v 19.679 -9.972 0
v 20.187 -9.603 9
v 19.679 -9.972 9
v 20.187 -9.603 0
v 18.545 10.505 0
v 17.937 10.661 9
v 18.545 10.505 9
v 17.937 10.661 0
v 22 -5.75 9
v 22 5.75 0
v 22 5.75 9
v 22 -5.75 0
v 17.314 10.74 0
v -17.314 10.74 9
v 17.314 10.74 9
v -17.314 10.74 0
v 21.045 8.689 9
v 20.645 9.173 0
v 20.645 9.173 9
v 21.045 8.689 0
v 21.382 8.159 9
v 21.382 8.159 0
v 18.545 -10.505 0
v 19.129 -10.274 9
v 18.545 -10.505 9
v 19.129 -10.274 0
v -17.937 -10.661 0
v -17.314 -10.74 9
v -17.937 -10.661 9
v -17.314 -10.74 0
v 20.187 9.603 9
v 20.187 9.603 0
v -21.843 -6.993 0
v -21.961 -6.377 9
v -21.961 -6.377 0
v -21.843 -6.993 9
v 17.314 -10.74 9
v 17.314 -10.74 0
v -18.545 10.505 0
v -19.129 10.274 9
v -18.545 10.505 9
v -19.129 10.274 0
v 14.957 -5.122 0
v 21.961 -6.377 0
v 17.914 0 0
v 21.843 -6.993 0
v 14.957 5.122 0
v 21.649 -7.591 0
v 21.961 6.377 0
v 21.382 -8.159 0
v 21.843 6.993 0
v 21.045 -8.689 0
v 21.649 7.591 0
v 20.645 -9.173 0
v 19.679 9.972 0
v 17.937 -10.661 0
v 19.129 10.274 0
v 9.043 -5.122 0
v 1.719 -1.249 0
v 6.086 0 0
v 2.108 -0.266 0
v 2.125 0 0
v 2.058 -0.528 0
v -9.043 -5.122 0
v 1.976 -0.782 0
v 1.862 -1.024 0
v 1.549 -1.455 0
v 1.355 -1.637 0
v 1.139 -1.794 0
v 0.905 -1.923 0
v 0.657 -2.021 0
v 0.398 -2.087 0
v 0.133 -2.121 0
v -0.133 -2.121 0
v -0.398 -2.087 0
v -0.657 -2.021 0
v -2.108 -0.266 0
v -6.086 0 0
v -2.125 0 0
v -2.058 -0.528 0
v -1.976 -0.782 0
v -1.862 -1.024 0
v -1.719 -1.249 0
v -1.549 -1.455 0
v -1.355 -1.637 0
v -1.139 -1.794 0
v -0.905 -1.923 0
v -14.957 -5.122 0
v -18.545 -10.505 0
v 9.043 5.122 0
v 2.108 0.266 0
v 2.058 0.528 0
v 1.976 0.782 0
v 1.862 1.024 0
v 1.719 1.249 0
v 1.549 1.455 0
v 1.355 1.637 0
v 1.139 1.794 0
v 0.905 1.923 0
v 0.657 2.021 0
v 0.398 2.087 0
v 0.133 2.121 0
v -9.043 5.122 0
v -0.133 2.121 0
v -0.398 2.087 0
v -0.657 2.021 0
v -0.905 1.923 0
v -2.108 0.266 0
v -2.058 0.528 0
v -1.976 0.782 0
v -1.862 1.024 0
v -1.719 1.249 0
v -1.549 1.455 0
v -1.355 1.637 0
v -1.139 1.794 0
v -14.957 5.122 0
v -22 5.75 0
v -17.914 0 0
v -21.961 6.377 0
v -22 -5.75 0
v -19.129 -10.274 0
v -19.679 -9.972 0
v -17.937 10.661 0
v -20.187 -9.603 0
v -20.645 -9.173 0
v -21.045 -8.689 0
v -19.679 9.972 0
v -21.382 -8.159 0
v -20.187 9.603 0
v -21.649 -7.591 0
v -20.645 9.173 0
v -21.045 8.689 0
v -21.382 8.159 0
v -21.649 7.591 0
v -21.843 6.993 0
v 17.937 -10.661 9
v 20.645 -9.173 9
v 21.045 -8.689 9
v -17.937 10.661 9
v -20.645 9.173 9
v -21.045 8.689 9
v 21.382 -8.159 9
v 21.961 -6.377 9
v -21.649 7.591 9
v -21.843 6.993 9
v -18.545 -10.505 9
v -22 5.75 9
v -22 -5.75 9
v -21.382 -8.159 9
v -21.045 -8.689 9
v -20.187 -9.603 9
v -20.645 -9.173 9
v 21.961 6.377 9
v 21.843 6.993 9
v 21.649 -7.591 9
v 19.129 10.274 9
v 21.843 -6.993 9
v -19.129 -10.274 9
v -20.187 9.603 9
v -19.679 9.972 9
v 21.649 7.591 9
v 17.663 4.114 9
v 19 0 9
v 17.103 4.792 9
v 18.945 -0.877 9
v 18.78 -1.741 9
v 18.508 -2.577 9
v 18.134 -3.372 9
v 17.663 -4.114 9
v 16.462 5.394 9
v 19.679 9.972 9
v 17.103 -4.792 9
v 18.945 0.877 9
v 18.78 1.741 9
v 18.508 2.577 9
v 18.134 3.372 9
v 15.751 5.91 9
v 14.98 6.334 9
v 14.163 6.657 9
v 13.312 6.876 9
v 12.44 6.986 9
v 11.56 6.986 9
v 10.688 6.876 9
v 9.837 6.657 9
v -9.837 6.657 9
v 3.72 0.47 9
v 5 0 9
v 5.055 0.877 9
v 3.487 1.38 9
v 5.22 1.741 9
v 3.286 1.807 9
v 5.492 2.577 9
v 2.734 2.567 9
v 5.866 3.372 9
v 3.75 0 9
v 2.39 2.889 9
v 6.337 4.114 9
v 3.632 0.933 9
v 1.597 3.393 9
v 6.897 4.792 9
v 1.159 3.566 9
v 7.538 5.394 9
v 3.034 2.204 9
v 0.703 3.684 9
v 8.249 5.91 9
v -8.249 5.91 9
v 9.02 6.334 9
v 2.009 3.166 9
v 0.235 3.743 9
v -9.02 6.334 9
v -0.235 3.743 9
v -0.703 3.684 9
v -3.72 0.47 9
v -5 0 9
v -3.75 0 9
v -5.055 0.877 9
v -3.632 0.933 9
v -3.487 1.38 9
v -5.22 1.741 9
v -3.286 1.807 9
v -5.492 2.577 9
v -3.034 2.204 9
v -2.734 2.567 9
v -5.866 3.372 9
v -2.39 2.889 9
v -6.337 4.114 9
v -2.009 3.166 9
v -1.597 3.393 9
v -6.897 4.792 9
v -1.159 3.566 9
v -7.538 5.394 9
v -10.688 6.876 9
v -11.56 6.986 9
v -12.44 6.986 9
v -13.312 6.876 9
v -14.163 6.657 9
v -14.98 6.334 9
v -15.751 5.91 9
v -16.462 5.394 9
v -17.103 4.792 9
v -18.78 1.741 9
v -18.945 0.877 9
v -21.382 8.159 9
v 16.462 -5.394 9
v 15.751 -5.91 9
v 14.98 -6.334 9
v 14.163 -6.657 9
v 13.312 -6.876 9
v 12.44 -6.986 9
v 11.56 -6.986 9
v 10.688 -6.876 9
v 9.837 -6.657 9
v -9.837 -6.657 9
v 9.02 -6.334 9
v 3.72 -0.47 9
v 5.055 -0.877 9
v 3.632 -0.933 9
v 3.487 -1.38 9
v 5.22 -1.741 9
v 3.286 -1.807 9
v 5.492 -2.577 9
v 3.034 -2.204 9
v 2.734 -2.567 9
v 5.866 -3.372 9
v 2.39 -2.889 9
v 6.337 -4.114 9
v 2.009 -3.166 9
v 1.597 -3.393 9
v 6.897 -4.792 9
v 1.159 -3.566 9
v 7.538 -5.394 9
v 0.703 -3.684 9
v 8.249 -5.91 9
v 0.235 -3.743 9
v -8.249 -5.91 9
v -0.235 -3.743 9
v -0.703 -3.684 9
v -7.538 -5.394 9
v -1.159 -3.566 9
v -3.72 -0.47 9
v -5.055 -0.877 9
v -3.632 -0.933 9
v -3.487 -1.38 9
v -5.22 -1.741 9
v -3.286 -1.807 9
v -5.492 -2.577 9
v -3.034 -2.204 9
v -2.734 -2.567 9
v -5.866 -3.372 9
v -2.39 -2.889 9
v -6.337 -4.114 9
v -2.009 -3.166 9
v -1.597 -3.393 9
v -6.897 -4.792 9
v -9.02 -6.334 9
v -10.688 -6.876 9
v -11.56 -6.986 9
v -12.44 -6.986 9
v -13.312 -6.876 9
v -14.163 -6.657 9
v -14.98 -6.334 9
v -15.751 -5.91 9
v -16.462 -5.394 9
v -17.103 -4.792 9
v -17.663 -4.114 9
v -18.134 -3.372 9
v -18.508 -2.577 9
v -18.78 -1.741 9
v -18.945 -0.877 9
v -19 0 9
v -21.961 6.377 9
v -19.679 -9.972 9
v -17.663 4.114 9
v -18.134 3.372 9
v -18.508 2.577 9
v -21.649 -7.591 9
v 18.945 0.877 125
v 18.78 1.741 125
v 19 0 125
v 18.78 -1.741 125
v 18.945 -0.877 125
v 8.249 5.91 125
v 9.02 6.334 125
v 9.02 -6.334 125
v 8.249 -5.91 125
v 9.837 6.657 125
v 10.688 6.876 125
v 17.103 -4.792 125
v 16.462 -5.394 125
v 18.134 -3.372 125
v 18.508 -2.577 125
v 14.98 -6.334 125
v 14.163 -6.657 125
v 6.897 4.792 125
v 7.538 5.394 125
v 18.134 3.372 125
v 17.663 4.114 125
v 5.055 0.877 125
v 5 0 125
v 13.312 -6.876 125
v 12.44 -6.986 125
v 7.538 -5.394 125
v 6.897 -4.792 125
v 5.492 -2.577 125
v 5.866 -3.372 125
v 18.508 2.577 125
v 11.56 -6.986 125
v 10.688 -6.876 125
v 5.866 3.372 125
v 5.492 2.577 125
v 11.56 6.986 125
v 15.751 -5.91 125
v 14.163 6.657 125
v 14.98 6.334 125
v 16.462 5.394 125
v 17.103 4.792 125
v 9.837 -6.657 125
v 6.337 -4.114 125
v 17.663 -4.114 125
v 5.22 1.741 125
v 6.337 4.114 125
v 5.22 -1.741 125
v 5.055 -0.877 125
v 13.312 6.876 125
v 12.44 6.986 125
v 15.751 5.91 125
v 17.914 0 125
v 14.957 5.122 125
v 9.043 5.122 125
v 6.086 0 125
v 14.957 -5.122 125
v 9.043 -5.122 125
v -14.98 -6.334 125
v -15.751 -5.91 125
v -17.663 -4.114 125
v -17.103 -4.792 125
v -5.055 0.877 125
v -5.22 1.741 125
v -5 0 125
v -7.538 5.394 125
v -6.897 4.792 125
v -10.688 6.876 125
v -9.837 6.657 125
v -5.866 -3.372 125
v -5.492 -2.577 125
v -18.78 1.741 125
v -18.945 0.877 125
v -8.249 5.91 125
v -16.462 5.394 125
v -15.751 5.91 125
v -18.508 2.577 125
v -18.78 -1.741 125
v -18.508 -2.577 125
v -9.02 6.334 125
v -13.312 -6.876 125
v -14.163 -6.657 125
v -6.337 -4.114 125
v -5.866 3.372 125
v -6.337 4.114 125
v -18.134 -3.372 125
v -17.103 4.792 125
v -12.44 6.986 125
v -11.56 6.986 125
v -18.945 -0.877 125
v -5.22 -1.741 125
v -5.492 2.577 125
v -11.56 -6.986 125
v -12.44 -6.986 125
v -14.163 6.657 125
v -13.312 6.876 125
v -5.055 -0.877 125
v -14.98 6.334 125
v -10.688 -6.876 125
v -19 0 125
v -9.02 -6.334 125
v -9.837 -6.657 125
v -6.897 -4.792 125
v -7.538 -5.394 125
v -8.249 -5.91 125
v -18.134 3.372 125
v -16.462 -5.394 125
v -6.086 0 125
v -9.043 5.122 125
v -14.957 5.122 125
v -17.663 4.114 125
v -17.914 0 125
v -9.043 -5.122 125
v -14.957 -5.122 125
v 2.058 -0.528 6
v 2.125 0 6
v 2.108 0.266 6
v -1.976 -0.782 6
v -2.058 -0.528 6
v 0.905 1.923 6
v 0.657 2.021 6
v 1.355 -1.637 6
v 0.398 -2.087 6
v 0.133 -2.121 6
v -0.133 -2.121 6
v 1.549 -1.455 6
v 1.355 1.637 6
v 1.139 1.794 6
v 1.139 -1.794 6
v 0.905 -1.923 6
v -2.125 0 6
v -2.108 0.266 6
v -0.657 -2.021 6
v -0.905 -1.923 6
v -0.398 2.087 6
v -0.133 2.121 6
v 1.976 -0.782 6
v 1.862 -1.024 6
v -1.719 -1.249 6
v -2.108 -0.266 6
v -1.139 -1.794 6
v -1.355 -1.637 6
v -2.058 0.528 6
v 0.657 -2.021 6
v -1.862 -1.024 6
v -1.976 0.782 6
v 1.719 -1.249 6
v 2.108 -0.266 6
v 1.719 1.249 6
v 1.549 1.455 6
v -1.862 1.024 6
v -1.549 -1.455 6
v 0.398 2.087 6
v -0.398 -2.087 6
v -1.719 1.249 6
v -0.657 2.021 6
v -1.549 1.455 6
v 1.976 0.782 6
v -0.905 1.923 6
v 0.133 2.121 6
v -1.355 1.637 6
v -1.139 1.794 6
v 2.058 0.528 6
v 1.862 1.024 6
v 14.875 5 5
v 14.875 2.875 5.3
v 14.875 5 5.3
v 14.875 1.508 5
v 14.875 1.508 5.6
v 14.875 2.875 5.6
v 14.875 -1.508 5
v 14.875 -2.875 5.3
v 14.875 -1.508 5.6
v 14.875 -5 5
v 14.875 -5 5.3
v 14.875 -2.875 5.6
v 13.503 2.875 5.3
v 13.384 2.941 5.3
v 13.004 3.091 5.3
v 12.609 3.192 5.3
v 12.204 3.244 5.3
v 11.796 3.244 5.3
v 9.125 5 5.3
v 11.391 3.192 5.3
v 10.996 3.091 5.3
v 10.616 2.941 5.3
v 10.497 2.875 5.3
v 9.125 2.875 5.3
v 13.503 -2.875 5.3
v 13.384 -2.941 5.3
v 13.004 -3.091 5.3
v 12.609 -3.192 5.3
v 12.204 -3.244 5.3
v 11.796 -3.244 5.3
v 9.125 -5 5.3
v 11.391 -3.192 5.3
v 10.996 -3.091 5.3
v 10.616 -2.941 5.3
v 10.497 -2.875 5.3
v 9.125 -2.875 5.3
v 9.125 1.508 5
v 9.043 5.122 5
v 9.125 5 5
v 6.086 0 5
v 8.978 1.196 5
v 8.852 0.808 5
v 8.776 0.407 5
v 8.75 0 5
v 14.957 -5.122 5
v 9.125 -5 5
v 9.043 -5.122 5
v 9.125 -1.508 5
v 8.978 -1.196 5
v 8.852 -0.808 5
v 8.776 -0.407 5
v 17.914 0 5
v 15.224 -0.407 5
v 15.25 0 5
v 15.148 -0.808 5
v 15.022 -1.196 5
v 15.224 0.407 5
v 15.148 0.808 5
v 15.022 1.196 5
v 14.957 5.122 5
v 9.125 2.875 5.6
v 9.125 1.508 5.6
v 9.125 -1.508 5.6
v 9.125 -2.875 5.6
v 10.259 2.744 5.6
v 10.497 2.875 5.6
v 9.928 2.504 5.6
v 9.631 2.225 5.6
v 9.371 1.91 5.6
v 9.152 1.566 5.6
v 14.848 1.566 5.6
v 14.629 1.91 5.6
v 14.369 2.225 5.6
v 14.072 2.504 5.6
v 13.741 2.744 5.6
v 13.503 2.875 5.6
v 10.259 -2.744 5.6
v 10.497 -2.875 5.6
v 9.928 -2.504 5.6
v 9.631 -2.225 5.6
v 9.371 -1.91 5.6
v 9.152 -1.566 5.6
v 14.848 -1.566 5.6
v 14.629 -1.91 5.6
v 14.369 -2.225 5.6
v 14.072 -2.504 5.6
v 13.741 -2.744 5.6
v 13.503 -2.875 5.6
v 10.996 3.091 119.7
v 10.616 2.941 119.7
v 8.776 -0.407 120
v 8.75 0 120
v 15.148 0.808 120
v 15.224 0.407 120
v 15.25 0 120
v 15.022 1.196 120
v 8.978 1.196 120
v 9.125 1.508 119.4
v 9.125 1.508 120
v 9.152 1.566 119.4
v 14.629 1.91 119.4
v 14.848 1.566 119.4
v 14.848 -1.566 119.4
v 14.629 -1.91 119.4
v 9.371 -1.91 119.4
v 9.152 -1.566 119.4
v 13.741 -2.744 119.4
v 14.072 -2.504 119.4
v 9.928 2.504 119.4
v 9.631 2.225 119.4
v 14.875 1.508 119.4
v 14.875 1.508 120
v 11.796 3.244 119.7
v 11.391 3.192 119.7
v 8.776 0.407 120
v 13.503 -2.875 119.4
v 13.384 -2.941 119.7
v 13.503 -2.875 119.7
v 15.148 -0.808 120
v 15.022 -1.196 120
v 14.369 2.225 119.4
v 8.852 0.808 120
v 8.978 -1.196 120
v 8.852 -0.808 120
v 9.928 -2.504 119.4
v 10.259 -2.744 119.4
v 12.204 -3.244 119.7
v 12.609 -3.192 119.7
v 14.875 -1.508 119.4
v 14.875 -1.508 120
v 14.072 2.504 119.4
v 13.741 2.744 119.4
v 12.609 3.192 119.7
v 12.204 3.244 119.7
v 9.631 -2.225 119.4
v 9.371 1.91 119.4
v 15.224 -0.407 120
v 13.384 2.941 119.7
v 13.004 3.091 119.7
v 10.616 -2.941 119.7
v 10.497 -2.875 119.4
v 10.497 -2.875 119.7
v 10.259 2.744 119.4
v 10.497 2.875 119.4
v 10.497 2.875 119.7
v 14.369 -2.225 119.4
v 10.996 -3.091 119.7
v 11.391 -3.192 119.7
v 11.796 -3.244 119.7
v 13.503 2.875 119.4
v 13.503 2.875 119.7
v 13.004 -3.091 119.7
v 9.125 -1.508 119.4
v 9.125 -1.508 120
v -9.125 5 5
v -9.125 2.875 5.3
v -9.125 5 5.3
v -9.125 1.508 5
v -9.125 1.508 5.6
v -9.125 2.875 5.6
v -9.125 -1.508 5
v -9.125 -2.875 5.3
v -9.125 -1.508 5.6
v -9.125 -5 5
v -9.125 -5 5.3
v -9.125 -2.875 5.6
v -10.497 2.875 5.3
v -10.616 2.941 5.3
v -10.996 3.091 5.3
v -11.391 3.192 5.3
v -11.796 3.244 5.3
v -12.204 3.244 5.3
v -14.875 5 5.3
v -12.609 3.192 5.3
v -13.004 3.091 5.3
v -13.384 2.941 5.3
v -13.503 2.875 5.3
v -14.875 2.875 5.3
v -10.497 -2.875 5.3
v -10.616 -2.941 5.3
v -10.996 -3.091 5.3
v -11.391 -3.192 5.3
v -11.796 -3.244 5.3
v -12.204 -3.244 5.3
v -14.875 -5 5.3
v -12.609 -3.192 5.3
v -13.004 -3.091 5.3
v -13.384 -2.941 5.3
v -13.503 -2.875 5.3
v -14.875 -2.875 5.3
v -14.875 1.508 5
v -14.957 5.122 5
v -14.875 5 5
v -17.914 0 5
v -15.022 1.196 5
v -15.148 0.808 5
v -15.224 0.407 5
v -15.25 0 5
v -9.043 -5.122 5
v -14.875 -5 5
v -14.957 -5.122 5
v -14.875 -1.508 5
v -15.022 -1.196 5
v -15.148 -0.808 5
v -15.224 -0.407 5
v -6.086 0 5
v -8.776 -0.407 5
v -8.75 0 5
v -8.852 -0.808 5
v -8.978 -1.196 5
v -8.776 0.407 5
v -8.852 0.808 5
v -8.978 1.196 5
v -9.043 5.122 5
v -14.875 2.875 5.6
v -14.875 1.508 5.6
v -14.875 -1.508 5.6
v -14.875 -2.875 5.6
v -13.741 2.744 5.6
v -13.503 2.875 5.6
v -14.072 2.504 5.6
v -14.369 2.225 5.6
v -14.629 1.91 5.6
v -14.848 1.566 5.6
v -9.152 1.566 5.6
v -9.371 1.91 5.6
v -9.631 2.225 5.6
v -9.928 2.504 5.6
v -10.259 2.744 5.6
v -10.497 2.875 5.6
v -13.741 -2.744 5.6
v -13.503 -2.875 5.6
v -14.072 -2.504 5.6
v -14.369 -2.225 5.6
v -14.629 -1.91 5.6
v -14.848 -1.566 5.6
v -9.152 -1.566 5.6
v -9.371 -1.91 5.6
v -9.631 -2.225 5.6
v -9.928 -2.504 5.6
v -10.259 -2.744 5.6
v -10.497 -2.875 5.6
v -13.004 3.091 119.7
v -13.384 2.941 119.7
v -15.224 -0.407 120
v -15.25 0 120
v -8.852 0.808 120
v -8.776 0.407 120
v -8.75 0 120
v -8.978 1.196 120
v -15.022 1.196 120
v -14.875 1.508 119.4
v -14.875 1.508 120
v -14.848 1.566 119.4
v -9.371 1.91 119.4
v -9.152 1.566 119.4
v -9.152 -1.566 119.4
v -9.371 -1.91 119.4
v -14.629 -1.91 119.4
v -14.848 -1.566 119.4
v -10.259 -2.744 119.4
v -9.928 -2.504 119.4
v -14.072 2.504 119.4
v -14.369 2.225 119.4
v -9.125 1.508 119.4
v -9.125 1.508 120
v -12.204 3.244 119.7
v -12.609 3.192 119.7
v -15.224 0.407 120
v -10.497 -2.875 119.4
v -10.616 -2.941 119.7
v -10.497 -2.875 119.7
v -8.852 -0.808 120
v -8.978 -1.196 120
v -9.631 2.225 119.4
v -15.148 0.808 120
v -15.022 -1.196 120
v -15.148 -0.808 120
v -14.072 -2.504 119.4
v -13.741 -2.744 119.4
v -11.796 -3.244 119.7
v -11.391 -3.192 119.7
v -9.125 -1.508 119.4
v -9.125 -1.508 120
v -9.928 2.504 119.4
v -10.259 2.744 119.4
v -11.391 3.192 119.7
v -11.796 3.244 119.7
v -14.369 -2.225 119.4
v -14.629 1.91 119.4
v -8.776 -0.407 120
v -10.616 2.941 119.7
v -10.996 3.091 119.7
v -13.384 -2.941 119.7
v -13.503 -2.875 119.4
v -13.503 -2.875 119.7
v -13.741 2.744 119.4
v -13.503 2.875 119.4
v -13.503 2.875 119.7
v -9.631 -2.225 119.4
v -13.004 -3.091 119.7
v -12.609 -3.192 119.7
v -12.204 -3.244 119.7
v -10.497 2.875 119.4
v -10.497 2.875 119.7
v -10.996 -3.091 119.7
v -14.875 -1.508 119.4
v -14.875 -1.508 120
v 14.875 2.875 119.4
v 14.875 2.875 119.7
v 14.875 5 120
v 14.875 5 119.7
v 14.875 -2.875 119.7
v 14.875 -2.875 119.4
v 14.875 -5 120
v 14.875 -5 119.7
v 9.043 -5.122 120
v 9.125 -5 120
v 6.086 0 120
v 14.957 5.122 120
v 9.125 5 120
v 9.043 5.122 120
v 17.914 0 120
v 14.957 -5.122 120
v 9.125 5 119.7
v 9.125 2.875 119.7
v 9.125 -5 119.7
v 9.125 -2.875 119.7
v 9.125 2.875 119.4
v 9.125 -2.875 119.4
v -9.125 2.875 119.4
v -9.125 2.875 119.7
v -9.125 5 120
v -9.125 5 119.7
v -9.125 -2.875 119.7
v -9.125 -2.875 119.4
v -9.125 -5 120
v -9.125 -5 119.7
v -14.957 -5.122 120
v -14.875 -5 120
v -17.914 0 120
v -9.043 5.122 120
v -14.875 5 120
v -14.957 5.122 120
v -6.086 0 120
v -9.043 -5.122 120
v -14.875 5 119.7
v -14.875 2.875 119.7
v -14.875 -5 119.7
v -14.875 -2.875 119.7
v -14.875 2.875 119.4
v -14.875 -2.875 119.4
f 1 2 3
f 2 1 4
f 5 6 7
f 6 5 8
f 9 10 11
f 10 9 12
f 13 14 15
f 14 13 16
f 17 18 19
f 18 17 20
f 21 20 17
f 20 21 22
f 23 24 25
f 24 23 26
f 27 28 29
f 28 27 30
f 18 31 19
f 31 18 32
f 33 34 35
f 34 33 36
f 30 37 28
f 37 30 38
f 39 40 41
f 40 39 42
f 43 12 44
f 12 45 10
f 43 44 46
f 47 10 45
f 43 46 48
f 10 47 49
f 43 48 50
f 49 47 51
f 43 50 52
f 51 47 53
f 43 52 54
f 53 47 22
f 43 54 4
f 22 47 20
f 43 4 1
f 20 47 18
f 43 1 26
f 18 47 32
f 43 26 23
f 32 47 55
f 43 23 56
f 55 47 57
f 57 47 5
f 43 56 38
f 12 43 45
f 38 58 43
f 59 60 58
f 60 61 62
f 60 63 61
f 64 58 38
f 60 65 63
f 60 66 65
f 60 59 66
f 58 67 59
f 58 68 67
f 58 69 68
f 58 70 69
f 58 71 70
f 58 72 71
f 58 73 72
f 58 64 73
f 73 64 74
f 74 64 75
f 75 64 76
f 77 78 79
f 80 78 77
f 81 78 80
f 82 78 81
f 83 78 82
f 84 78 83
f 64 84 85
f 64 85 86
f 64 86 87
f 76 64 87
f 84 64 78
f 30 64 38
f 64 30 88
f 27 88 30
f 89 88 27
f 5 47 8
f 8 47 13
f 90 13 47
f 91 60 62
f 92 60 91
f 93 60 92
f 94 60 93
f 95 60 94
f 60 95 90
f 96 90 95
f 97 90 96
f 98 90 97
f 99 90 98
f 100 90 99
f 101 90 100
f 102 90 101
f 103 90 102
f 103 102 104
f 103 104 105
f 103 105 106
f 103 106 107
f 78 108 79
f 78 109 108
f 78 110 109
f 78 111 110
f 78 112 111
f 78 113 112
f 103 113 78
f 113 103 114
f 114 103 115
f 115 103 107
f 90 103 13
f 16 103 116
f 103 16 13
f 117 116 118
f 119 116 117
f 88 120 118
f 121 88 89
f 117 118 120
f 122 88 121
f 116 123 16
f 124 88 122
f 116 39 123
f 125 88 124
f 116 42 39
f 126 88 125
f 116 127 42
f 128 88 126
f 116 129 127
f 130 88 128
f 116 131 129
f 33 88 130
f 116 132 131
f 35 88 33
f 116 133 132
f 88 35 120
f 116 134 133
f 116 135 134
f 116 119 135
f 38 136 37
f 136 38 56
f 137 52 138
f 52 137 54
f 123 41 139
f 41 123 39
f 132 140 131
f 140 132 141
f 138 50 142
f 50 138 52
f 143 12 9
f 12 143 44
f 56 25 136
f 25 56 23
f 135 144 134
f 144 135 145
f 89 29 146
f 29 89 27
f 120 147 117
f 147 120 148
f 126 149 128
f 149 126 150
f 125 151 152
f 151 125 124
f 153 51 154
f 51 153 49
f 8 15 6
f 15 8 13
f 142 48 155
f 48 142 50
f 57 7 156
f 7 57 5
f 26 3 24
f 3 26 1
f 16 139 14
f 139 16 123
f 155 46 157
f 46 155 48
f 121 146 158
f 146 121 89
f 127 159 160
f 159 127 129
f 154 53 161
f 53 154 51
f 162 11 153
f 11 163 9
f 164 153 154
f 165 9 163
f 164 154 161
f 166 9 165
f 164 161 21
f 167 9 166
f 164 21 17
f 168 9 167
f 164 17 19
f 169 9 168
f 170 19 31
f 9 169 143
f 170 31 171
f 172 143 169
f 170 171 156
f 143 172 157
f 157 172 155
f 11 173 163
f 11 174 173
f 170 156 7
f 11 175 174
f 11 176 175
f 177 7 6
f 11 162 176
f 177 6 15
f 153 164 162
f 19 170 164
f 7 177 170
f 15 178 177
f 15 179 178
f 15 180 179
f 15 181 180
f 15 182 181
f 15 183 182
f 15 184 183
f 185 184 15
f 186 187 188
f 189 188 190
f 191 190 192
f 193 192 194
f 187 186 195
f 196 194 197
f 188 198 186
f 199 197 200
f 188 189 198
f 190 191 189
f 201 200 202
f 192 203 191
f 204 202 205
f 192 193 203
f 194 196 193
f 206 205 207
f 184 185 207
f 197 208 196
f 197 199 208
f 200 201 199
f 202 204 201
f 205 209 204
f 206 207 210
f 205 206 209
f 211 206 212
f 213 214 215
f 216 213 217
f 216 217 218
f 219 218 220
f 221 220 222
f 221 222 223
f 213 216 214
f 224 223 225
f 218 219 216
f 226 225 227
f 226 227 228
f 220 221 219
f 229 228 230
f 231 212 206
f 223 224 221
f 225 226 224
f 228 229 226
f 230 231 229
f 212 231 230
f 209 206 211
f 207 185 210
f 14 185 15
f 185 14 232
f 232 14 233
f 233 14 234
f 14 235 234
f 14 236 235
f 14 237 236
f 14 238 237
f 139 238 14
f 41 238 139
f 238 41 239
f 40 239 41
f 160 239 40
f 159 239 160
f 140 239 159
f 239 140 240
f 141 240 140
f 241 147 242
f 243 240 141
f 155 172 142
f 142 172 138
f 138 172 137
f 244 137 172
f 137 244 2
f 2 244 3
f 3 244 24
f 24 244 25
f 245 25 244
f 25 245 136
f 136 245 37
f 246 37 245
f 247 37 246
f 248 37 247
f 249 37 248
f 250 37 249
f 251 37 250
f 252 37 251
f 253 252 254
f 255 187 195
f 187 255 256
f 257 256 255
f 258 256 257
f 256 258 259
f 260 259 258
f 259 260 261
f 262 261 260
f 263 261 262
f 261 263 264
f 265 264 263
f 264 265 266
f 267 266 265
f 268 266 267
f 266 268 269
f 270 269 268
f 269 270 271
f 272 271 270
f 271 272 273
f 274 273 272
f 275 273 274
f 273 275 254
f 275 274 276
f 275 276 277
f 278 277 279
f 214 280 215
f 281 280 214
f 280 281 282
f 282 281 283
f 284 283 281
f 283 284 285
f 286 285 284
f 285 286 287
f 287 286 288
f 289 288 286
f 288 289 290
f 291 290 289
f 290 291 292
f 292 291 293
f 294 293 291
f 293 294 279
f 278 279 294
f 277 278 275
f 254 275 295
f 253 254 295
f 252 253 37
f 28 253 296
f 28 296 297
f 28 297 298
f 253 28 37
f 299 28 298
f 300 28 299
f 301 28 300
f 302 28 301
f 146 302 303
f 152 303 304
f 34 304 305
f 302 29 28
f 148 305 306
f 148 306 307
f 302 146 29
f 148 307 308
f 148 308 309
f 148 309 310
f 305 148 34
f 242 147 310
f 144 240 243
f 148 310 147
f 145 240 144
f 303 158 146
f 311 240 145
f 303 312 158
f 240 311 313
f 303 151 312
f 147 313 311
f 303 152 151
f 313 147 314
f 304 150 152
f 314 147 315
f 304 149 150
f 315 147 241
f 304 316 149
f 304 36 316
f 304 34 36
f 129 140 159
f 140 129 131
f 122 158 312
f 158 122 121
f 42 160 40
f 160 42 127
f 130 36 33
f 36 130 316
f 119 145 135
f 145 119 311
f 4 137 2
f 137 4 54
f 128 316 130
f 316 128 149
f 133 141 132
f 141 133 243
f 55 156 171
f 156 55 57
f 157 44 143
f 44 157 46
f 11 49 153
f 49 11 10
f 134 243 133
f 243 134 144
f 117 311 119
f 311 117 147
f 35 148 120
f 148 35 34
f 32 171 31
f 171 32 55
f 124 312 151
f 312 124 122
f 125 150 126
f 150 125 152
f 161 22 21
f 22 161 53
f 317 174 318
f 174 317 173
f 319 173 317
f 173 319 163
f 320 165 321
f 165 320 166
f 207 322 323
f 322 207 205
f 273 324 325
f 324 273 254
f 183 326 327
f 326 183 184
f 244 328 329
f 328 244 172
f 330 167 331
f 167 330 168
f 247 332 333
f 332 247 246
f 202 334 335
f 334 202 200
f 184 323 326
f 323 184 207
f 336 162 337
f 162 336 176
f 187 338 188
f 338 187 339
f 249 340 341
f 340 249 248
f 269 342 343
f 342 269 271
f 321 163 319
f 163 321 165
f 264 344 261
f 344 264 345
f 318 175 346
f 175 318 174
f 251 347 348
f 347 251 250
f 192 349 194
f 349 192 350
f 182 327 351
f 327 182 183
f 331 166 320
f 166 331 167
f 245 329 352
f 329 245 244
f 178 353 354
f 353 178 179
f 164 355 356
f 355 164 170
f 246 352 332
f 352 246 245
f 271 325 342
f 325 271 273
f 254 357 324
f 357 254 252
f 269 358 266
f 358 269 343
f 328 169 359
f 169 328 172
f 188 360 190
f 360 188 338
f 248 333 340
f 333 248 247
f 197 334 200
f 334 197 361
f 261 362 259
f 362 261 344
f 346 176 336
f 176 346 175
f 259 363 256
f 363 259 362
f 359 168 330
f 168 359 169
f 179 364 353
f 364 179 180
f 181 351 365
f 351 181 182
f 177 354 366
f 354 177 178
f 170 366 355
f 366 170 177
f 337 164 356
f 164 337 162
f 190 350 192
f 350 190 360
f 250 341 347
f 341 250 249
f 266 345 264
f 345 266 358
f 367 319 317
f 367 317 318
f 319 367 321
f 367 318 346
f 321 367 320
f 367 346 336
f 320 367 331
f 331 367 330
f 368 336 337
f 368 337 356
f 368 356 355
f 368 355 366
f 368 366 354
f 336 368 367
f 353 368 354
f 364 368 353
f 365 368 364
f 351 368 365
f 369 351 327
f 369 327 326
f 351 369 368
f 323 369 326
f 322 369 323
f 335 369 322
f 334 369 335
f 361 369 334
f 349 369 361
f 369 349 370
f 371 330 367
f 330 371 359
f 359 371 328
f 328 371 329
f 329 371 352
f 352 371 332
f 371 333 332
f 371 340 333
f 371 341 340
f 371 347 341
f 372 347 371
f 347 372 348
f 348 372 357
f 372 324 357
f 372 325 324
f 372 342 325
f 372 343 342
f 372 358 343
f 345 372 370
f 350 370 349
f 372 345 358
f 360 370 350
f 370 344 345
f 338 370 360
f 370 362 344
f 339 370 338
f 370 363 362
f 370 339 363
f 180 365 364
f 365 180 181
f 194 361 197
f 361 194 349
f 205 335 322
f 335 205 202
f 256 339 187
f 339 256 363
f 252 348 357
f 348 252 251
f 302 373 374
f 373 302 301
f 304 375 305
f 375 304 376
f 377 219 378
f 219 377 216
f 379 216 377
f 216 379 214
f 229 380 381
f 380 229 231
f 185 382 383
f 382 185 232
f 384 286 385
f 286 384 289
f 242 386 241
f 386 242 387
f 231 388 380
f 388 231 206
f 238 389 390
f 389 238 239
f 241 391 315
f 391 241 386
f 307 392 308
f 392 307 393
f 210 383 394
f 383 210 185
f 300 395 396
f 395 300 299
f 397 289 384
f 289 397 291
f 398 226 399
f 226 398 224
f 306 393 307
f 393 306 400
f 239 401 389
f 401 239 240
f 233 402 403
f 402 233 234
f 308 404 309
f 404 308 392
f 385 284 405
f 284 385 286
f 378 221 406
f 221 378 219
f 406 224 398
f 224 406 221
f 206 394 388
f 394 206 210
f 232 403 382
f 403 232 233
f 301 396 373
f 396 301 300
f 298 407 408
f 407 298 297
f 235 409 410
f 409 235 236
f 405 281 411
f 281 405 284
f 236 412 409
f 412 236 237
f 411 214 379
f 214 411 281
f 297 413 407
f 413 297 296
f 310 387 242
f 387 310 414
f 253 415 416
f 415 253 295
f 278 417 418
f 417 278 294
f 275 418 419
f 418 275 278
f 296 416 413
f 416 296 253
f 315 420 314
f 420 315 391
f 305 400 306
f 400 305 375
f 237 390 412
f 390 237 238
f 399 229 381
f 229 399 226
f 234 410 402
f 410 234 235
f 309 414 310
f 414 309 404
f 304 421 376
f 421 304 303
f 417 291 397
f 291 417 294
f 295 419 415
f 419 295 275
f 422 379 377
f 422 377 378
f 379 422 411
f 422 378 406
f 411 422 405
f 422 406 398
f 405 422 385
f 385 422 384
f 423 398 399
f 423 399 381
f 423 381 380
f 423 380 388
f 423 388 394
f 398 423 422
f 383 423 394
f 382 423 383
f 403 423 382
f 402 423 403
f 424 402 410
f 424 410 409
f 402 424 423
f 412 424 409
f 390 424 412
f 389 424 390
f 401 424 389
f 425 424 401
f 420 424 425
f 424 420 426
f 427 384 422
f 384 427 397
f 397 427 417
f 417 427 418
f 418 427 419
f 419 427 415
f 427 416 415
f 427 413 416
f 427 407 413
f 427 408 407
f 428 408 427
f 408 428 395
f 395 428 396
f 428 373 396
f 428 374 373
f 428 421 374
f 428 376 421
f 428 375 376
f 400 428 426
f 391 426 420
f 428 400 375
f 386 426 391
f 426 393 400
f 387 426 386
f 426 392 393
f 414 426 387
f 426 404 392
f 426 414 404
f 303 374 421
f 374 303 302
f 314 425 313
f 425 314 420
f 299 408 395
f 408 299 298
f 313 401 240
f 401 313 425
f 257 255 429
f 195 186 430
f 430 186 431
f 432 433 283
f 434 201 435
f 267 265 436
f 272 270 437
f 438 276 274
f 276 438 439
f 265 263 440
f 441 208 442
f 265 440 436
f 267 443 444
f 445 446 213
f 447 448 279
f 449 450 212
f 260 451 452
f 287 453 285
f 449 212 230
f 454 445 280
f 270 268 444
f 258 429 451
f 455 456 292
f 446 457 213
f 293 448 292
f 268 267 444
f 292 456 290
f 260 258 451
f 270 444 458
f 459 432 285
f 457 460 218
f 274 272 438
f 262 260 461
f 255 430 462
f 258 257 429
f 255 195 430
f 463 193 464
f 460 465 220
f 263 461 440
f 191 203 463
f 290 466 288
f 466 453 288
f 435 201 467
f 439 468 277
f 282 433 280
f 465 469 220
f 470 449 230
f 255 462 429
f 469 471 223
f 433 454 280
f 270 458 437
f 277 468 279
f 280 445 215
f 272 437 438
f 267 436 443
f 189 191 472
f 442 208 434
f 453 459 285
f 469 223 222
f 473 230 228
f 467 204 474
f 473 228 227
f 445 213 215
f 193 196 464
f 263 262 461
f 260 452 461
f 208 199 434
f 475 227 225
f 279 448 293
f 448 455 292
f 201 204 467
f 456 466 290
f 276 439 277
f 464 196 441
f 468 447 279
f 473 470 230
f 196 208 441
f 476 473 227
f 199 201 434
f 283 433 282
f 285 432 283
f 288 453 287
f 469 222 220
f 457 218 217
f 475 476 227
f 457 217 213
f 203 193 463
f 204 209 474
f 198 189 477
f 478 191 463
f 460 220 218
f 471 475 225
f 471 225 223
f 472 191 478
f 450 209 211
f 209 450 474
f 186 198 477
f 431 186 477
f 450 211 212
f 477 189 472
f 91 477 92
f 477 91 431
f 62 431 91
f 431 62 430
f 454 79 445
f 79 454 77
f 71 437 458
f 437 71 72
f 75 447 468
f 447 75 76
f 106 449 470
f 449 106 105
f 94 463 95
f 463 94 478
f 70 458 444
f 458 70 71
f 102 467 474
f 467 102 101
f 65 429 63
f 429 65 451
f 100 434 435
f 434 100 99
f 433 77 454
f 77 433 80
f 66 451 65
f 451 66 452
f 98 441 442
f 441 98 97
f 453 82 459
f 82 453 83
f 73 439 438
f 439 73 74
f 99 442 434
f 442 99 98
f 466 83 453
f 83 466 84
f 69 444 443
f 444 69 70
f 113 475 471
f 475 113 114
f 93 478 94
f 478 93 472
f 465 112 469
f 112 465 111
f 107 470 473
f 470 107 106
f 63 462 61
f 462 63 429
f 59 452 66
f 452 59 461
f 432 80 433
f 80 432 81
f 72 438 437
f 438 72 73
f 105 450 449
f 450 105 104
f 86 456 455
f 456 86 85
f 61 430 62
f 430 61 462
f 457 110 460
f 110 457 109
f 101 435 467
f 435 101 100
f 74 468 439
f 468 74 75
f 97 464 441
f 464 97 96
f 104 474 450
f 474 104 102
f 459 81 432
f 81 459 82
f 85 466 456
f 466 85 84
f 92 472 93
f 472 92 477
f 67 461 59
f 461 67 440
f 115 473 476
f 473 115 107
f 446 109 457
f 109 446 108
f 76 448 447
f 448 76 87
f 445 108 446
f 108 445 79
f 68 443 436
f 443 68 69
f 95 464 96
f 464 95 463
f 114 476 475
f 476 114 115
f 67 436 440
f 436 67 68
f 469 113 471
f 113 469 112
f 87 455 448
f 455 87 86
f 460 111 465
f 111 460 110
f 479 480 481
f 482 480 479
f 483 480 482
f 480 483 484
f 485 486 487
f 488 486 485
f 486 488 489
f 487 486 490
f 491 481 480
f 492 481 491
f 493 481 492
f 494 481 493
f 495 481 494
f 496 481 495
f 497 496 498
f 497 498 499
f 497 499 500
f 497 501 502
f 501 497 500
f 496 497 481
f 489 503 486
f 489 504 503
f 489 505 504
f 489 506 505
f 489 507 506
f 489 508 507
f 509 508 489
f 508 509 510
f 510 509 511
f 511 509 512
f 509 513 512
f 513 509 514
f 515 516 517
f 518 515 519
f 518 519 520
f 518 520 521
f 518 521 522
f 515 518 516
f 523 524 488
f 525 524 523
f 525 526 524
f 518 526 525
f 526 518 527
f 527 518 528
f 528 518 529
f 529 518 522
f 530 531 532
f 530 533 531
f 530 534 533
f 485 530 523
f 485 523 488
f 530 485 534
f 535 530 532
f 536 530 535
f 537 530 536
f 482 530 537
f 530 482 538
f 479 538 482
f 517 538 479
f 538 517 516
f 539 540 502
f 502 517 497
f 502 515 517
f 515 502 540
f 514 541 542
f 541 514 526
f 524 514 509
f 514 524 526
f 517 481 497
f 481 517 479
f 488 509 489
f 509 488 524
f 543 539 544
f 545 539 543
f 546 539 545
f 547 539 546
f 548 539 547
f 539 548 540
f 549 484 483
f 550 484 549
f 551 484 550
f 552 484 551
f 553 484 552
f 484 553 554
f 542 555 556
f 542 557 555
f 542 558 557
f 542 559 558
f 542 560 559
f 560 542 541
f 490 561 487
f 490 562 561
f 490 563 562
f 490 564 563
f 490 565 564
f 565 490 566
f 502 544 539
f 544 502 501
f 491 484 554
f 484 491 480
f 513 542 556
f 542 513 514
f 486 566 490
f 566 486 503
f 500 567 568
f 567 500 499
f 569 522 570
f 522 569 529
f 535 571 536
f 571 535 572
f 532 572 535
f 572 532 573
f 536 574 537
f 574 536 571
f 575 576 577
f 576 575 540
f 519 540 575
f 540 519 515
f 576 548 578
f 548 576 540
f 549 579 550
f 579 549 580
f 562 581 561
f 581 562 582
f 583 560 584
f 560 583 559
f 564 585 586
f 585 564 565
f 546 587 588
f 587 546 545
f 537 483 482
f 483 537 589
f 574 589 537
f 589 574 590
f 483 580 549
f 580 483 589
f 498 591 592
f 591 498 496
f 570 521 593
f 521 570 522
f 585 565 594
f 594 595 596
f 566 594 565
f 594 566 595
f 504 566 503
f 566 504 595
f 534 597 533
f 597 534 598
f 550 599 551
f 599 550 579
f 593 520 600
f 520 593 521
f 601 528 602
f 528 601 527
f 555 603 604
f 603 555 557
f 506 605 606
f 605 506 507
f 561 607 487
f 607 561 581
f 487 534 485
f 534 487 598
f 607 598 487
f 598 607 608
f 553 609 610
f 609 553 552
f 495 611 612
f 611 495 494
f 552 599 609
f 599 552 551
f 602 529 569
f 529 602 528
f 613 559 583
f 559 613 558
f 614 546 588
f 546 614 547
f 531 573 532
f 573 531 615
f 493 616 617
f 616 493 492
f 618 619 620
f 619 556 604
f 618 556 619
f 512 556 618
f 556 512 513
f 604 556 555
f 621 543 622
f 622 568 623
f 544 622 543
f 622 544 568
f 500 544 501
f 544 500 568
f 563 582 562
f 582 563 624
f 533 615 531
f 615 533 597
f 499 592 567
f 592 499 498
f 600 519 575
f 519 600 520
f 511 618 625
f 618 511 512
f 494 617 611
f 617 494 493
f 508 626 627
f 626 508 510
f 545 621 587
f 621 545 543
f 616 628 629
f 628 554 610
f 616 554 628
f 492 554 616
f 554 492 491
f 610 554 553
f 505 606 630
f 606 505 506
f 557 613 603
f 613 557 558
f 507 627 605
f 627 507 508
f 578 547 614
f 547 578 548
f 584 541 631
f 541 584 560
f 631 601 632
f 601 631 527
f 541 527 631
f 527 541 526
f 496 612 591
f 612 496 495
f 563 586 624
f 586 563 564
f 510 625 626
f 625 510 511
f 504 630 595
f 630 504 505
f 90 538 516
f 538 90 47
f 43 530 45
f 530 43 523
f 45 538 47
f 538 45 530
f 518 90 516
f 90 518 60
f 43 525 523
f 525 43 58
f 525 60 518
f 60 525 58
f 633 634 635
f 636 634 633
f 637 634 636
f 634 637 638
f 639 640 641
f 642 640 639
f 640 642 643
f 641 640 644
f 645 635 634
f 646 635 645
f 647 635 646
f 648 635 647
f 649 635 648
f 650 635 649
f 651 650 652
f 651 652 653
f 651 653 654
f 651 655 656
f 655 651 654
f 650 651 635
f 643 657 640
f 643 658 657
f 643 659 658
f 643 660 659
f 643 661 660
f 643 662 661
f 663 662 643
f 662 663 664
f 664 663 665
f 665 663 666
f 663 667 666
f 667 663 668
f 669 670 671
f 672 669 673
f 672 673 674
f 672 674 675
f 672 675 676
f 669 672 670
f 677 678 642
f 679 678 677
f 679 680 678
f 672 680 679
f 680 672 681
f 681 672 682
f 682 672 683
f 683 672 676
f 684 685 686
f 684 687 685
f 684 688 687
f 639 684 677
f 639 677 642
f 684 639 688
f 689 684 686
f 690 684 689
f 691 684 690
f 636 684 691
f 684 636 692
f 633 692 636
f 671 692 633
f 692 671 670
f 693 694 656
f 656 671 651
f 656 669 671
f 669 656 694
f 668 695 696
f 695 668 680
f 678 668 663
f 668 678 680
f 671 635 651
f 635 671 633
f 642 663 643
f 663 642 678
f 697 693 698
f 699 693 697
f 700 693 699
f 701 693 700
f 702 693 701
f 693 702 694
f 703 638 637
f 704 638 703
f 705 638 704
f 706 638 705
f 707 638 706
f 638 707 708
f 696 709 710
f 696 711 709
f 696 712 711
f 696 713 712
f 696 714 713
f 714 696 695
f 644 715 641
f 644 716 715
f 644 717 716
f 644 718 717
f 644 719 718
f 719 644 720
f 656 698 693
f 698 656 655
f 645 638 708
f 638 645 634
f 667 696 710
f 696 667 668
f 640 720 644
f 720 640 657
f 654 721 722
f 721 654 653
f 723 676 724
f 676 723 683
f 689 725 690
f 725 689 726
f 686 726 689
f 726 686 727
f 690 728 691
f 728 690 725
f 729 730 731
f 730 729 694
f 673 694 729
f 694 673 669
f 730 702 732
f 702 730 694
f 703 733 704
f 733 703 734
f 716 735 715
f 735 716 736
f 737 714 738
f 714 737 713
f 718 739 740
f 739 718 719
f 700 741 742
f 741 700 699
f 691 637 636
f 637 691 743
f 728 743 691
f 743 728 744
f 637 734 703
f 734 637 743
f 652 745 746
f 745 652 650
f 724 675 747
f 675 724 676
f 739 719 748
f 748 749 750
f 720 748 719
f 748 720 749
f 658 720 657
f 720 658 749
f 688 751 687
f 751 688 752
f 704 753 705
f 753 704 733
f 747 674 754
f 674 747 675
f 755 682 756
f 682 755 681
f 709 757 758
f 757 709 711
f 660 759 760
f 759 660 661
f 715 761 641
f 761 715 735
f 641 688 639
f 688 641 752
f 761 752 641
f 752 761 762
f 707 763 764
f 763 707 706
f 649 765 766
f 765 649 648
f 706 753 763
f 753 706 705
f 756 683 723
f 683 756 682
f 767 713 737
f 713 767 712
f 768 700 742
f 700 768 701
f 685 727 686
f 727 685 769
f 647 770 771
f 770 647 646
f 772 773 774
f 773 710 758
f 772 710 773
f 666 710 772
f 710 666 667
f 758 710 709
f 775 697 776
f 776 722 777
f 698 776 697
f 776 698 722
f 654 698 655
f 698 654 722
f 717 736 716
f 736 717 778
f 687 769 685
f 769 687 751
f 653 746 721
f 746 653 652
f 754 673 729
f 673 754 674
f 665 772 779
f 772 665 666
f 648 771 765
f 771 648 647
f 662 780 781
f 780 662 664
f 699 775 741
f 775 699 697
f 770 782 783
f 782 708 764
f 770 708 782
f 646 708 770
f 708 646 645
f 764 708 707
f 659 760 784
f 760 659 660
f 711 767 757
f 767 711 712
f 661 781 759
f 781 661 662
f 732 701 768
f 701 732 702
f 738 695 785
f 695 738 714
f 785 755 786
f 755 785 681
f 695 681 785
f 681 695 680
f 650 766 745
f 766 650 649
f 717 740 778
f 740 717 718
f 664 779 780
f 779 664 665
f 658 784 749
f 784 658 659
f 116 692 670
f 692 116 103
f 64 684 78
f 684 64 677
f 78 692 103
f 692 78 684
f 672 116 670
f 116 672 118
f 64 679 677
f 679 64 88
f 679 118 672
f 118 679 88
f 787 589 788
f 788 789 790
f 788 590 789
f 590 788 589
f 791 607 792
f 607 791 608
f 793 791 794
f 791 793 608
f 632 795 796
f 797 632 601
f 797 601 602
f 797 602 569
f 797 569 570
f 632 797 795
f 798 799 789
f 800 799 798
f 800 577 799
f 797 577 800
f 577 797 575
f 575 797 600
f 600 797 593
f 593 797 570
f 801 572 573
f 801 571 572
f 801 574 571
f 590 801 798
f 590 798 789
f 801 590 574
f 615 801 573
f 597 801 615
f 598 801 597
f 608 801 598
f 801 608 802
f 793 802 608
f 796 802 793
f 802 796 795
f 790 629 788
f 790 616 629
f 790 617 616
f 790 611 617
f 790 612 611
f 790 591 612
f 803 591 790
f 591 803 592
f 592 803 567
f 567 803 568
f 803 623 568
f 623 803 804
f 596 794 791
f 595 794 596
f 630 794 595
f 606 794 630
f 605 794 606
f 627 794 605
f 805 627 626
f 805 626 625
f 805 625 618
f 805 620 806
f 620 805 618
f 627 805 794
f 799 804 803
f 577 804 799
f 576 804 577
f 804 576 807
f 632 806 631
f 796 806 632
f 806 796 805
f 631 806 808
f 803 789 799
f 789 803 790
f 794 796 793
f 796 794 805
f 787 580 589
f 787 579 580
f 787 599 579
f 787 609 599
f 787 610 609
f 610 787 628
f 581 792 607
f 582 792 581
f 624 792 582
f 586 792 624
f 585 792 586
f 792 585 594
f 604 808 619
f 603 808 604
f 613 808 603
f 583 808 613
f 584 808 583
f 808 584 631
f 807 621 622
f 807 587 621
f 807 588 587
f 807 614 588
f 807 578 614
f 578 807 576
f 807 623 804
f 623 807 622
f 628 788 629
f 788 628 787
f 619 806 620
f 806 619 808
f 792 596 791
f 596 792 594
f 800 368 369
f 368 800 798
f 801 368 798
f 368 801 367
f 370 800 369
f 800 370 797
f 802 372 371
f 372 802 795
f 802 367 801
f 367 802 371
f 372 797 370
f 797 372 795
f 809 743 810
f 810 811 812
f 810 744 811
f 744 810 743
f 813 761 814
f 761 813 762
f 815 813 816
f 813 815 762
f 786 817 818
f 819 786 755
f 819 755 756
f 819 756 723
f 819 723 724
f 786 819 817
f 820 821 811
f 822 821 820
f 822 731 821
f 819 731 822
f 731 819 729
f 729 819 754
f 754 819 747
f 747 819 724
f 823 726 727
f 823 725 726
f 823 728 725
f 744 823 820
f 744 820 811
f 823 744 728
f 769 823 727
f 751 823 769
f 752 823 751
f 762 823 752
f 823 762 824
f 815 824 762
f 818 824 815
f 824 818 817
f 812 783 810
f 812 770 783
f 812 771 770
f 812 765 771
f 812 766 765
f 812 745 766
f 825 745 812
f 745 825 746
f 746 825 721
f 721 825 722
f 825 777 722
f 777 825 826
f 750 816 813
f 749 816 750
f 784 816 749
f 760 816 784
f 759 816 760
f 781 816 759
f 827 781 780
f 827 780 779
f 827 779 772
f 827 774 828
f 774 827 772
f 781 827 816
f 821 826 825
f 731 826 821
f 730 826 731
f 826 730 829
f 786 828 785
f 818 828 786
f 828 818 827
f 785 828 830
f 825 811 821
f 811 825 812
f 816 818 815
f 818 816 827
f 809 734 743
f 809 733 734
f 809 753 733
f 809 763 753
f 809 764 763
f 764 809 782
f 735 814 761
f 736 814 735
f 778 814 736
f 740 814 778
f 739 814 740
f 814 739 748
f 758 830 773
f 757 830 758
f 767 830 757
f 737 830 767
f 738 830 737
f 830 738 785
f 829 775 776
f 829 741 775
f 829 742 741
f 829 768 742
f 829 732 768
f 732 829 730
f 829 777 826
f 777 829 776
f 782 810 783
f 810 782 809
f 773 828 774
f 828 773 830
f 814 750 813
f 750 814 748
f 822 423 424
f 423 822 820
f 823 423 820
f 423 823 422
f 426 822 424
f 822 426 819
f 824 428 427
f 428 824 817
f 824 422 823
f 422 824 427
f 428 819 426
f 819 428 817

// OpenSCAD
$fn = 50;


difference() {
	union() {
		hull() {
			translate(v = [-17.0000000000, 5.7500000000, 0]) {
				cylinder(h = 9, r = 5);
			}
			translate(v = [17.0000000000, 5.7500000000, 0]) {
				cylinder(h = 9, r = 5);
			}
			translate(v = [-17.0000000000, -5.7500000000, 0]) {
				cylinder(h = 9, r = 5);
			}
			translate(v = [17.0000000000, -5.7500000000, 0]) {
				cylinder(h = 9, r = 5);
			}
		}
		translate(v = [12.0000000000, 0, 0.0000000000]) {
			cylinder(h = 125, r = 7.0000000000);
		}
		translate(v = [-12.0000000000, 0, 0.0000000000]) {
			cylinder(h = 125, r = 7.0000000000);
		}
		translate(v = [12.0000000000, 0, 119.0000000000]) {
			cylinder(h = 6, r = 7.0000000000);
		}
		translate(v = [-12.0000000000, 0, 119.0000000000]) {
			cylinder(h = 6, r = 7.0000000000);
		}
	}
	union() {
		translate(v = [0, 0, 9]) {
			rotate(a = [0, 0, 0]) {
				difference() {
					union() {
						#translate(v = [0, 0, -120.0000000000]) {
							cylinder(h = 120, r = 2.0000000000);
						}
						#translate(v = [0, 0, -3]) {
							cylinder(h = 3, r1 = 2.1250000000, r2 = 3.7500000000);
						}
						#translate(v = [0, 0, -120.0000000000]) {
							cylinder(h = 120, r = 2.1250000000);
						}
						#translate(v = [0, 0, -120.0000000000]) {
							cylinder(h = 120, r = 2.0000000000);
						}
					}
					union();
				}
			}
		}
		translate(v = [12.0000000000, 0, 0]) {
			rotate(a = [0, 0, 0]) {
				difference() {
					union() {
						#translate(v = [-2.8750000000, -5.0000000000, -0.3000000000]) {
							cube(size = [5.7500000000, 10, 0.3000000000]);
						}
						#translate(v = [-2.8750000000, -2.8750000000, -0.6000000000]) {
							cube(size = [5.7500000000, 5.7500000000, 0.3000000000]);
						}
						#translate(v = [-2.8750000000, -5.0000000000, 5]) {
							cube(size = [5.7500000000, 10, 0.3000000000]);
						}
						#translate(v = [-2.8750000000, -2.8750000000, 5.3000000000]) {
							cube(size = [5.7500000000, 5.7500000000, 0.3000000000]);
						}
						#translate(v = [0, 0, -100.0000000000]) {
							cylinder(h = 200, r = 3.2500000000);
						}
						#linear_extrude(height = 5) {
							polygon(points = [[5.9142500000, 0.0000000000], [2.9571250000, 5.1218907443], [-2.9571250000, 5.1218907443], [-5.9142500000, 0.0000000000], [-2.9571250000, -5.1218907443], [2.9571250000, -5.1218907443]]);
						}
						#translate(v = [-2.8750000000, -5.0000000000, -0.3000000000]) {
							cube(size = [5.7500000000, 10, 0.3000000000]);
						}
						#translate(v = [-2.8750000000, -2.8750000000, -0.6000000000]) {
							cube(size = [5.7500000000, 5.7500000000, 0.3000000000]);
						}
						#translate(v = [-2.8750000000, -5.0000000000, 5]) {
							cube(size = [5.7500000000, 10, 0.3000000000]);
						}
						#translate(v = [-2.8750000000, -2.8750000000, 5.3000000000]) {
							cube(size = [5.7500000000, 5.7500000000, 0.3000000000]);
						}
						#translate(v = [0, 0, -100.0000000000]) {
							cylinder(h = 200, r = 3.2500000000);
						}
						#translate(v = [-2.8750000000, -5.0000000000, -0.3000000000]) {
							cube(size = [5.7500000000, 10, 0.3000000000]);
						}
						#translate(v = [-2.8750000000, -2.8750000000, -0.6000000000]) {
							cube(size = [5.7500000000, 5.7500000000, 0.3000000000]);
						}
						#translate(v = [-2.8750000000, -5.0000000000, 5]) {
							cube(size = [5.7500000000, 10, 0.3000000000]);
						}
						#translate(v = [-2.8750000000, -2.8750000000, 5.3000000000]) {
							cube(size = [5.7500000000, 5.7500000000, 0.3000000000]);
						}
						#translate(v = [0, 0, -100.0000000000]) {
							cylinder(h = 200, r = 3.2500000000);
						}
					}
					union();
				}
			}
		}
		translate(v = [-12.0000000000, 0, 0]) {
			rotate(a = [0, 0, 0]) {
				difference() {
					union() {
						#translate(v = [-2.8750000000, -5.0000000000, -0.3000000000]) {
							cube(size = [5.7500000000, 10, 0.3000000000]);
						}
						#translate(v = [-2.8750000000, -2.8750000000, -0.6000000000]) {
							cube(size = [5.7500000000, 5.7500000000, 0.3000000000]);
						}
						#translate(v = [-2.8750000000, -5.0000000000, 5]) {
							cube(size = [5.7500000000, 10, 0.3000000000]);
						}
						#translate(v = [-2.8750000000, -2.8750000000, 5.3000000000]) {
							cube(size = [5.7500000000, 5.7500000000, 0.3000000000]);
						}
						#translate(v = [0, 0, -100.0000000000]) {
							cylinder(h = 200, r = 3.2500000000);
						}
						#linear_extrude(height = 5) {
							polygon(points = [[5.9142500000, 0.0000000000], [2.9571250000, 5.1218907443], [-2.9571250000, 5.1218907443], [-5.9142500000, 0.0000000000], [-2.9571250000, -5.1218907443], [2.9571250000, -5.1218907443]]);
						}
						#translate(v = [-2.8750000000, -5.0000000000, -0.3000000000]) {
							cube(size = [5.7500000000, 10, 0.3000000000]);
						}
						#translate(v = [-2.8750000000, -2.8750000000, -0.6000000000]) {
							cube(size = [5.7500000000, 5.7500000000, 0.3000000000]);
						}
						#translate(v = [-2.8750000000, -5.0000000000, 5]) {
							cube(size = [5.7500000000, 10, 0.3000000000]);
						}
						#translate(v = [-2.8750000000, -2.8750000000, 5.3000000000]) {
							cube(size = [5.7500000000, 5.7500000000, 0.3000000000]);
						}
						#translate(v = [0, 0, -100.0000000000]) {
							cylinder(h = 200, r = 3.2500000000);
						}
						#translate(v = [-2.8750000000, -5.0000000000, -0.3000000000]) {
							cube(size = [5.7500000000, 10, 0.3000000000]);
						}
						#translate(v = [-2.8750000000, -2.8750000000, -0.6000000000]) {
							cube(size = [5.7500000000, 5.7500000000, 0.3000000000]);
						}
						#translate(v = [-2.8750000000, -5.0000000000, 5]) {
							cube(size = [5.7500000000, 10, 0.3000000000]);
						}
						#translate(v = [-2.8750000000, -2.8750000000, 5.3000000000]) {
							cube(size = [5.7500000000, 5.7500000000, 0.3000000000]);
						}
						#translate(v = [0, 0, -100.0000000000]) {
							cylinder(h = 200, r = 3.2500000000);
						}
					}
					union();
				}
			}
		}
		translate(v = [12.0000000000, 0, 125]) {
			rotate(a = [0, 0, 0]) {
				difference() {
					union() {
						#translate(v = [-2.8750000000, -5.0000000000, -5.3000000000]) {
							cube(size = [5.7500000000, 10, 0.3000000000]);
						}
						#translate(v = [-2.8750000000, -2.8750000000, -5.6000000000]) {
							cube(size = [5.7500000000, 5.7500000000, 0.3000000000]);
						}
						#translate(v = [-2.8750000000, -5.0000000000, 0]) {
							cube(size = [5.7500000000, 10, 0.3000000000]);
						}
						#translate(v = [-2.8750000000, -2.8750000000, 0.3000000000]) {
							cube(size = [5.7500000000, 5.7500000000, 0.3000000000]);
						}
						#translate(v = [0, 0, -100.0000000000]) {
							cylinder(h = 200, r = 3.2500000000);
						}
						translate(v = [0, 0, -5]) {
							#linear_extrude(height = 5) {
								polygon(points = [[5.9142500000, 0.0000000000], [2.9571250000, 5.1218907443], [-2.9571250000, 5.1218907443], [-5.9142500000, 0.0000000000], [-2.9571250000, -5.1218907443], [2.9571250000, -5.1218907443]]);
							}
						}
						#translate(v = [-2.8750000000, -5.0000000000, -5.3000000000]) {
							cube(size = [5.7500000000, 10, 0.3000000000]);
						}
						#translate(v = [-2.8750000000, -2.8750000000, -5.6000000000]) {
							cube(size = [5.7500000000, 5.7500000000, 0.3000000000]);
						}
						#translate(v = [-2.8750000000, -5.0000000000, 0]) {
							cube(size = [5.7500000000, 10, 0.3000000000]);
						}
						#translate(v = [-2.8750000000, -2.8750000000, 0.3000000000]) {
							cube(size = [5.7500000000, 5.7500000000, 0.3000000000]);
						}
						#translate(v = [0, 0, -100.0000000000]) {
							cylinder(h = 200, r = 3.2500000000);
						}
						#translate(v = [-2.8750000000, -5.0000000000, -5.3000000000]) {
							cube(size = [5.7500000000, 10, 0.3000000000]);
						}
						#translate(v = [-2.8750000000, -2.8750000000, -5.6000000000]) {
							cube(size = [5.7500000000, 5.7500000000, 0.3000000000]);
						}
						#translate(v = [-2.8750000000, -5.0000000000, 0]) {
							cube(size = [5.7500000000, 10, 0.3000000000]);
						}
						#translate(v = [-2.8750000000, -2.8750000000, 0.3000000000]) {
							cube(size = [5.7500000000, 5.7500000000, 0.3000000000]);
						}
						#translate(v = [0, 0, -100.0000000000]) {
							cylinder(h = 200, r = 3.2500000000);
						}
					}
					union();
				}
			}
		}
		translate(v = [-12.0000000000, 0, 125]) {
			rotate(a = [0, 0, 0]) {
				difference() {
					union() {
						#translate(v = [-2.8750000000, -5.0000000000, -5.3000000000]) {
							cube(size = [5.7500000000, 10, 0.3000000000]);
						}
						#translate(v = [-2.8750000000, -2.8750000000, -5.6000000000]) {
							cube(size = [5.7500000000, 5.7500000000, 0.3000000000]);
						}
						#translate(v = [-2.8750000000, -5.0000000000, 0]) {
							cube(size = [5.7500000000, 10, 0.3000000000]);
						}
						#translate(v = [-2.8750000000, -2.8750000000, 0.3000000000]) {
							cube(size = [5.7500000000, 5.7500000000, 0.3000000000]);
						}
						#translate(v = [0, 0, -100.0000000000]) {
							cylinder(h = 200, r = 3.2500000000);
						}
						translate(v = [0, 0, -5]) {
							#linear_extrude(height = 5) {
								polygon(points = [[5.9142500000, 0.0000000000], [2.9571250000, 5.1218907443], [-2.9571250000, 5.1218907443], [-5.9142500000, 0.0000000000], [-2.9571250000, -5.1218907443], [2.9571250000, -5.1218907443]]);
							}
						}
						#translate(v = [-2.8750000000, -5.0000000000, -5.3000000000]) {
							cube(size = [5.7500000000, 10, 0.3000000000]);
						}
						#translate(v = [-2.8750000000, -2.8750000000, -5.6000000000]) {
							cube(size = [5.7500000000, 5.7500000000, 0.3000000000]);
						}
						#translate(v = [-2.8750000000, -5.0000000000, 0]) {
							cube(size = [5.7500000000, 10, 0.3000000000]);
						}
						#translate(v = [-2.8750000000, -2.8750000000, 0.3000000000]) {
							cube(size = [5.7500000000, 5.7500000000, 0.3000000000]);
						}
						#translate(v = [0, 0, -100.0000000000]) {
							cylinder(h = 200, r = 3.2500000000);
						}
						#translate(v = [-2.8750000000, -5.0000000000, -5.3000000000]) {
							cube(size = [5.7500000000, 10, 0.3000000000]);
						}
						#translate(v = [-2.8750000000, -2.8750000000, -5.6000000000]) {
							cube(size = [5.7500000000, 5.7500000000, 0.3000000000]);
						}
						#translate(v = [-2.8750000000, -5.0000000000, 0]) {
							cube(size = [5.7500000000, 10, 0.3000000000]);
						}
						#translate(v = [-2.8750000000, -2.8750000000, 0.3000000000]) {
							cube(size = [5.7500000000, 5.7500000000, 0.3000000000]);
						}
						#translate(v = [0, 0, -100.0000000000]) {
							cylinder(h = 200, r = 3.2500000000);
						}
					}
					union();
				}
			}
		}
	}
}
